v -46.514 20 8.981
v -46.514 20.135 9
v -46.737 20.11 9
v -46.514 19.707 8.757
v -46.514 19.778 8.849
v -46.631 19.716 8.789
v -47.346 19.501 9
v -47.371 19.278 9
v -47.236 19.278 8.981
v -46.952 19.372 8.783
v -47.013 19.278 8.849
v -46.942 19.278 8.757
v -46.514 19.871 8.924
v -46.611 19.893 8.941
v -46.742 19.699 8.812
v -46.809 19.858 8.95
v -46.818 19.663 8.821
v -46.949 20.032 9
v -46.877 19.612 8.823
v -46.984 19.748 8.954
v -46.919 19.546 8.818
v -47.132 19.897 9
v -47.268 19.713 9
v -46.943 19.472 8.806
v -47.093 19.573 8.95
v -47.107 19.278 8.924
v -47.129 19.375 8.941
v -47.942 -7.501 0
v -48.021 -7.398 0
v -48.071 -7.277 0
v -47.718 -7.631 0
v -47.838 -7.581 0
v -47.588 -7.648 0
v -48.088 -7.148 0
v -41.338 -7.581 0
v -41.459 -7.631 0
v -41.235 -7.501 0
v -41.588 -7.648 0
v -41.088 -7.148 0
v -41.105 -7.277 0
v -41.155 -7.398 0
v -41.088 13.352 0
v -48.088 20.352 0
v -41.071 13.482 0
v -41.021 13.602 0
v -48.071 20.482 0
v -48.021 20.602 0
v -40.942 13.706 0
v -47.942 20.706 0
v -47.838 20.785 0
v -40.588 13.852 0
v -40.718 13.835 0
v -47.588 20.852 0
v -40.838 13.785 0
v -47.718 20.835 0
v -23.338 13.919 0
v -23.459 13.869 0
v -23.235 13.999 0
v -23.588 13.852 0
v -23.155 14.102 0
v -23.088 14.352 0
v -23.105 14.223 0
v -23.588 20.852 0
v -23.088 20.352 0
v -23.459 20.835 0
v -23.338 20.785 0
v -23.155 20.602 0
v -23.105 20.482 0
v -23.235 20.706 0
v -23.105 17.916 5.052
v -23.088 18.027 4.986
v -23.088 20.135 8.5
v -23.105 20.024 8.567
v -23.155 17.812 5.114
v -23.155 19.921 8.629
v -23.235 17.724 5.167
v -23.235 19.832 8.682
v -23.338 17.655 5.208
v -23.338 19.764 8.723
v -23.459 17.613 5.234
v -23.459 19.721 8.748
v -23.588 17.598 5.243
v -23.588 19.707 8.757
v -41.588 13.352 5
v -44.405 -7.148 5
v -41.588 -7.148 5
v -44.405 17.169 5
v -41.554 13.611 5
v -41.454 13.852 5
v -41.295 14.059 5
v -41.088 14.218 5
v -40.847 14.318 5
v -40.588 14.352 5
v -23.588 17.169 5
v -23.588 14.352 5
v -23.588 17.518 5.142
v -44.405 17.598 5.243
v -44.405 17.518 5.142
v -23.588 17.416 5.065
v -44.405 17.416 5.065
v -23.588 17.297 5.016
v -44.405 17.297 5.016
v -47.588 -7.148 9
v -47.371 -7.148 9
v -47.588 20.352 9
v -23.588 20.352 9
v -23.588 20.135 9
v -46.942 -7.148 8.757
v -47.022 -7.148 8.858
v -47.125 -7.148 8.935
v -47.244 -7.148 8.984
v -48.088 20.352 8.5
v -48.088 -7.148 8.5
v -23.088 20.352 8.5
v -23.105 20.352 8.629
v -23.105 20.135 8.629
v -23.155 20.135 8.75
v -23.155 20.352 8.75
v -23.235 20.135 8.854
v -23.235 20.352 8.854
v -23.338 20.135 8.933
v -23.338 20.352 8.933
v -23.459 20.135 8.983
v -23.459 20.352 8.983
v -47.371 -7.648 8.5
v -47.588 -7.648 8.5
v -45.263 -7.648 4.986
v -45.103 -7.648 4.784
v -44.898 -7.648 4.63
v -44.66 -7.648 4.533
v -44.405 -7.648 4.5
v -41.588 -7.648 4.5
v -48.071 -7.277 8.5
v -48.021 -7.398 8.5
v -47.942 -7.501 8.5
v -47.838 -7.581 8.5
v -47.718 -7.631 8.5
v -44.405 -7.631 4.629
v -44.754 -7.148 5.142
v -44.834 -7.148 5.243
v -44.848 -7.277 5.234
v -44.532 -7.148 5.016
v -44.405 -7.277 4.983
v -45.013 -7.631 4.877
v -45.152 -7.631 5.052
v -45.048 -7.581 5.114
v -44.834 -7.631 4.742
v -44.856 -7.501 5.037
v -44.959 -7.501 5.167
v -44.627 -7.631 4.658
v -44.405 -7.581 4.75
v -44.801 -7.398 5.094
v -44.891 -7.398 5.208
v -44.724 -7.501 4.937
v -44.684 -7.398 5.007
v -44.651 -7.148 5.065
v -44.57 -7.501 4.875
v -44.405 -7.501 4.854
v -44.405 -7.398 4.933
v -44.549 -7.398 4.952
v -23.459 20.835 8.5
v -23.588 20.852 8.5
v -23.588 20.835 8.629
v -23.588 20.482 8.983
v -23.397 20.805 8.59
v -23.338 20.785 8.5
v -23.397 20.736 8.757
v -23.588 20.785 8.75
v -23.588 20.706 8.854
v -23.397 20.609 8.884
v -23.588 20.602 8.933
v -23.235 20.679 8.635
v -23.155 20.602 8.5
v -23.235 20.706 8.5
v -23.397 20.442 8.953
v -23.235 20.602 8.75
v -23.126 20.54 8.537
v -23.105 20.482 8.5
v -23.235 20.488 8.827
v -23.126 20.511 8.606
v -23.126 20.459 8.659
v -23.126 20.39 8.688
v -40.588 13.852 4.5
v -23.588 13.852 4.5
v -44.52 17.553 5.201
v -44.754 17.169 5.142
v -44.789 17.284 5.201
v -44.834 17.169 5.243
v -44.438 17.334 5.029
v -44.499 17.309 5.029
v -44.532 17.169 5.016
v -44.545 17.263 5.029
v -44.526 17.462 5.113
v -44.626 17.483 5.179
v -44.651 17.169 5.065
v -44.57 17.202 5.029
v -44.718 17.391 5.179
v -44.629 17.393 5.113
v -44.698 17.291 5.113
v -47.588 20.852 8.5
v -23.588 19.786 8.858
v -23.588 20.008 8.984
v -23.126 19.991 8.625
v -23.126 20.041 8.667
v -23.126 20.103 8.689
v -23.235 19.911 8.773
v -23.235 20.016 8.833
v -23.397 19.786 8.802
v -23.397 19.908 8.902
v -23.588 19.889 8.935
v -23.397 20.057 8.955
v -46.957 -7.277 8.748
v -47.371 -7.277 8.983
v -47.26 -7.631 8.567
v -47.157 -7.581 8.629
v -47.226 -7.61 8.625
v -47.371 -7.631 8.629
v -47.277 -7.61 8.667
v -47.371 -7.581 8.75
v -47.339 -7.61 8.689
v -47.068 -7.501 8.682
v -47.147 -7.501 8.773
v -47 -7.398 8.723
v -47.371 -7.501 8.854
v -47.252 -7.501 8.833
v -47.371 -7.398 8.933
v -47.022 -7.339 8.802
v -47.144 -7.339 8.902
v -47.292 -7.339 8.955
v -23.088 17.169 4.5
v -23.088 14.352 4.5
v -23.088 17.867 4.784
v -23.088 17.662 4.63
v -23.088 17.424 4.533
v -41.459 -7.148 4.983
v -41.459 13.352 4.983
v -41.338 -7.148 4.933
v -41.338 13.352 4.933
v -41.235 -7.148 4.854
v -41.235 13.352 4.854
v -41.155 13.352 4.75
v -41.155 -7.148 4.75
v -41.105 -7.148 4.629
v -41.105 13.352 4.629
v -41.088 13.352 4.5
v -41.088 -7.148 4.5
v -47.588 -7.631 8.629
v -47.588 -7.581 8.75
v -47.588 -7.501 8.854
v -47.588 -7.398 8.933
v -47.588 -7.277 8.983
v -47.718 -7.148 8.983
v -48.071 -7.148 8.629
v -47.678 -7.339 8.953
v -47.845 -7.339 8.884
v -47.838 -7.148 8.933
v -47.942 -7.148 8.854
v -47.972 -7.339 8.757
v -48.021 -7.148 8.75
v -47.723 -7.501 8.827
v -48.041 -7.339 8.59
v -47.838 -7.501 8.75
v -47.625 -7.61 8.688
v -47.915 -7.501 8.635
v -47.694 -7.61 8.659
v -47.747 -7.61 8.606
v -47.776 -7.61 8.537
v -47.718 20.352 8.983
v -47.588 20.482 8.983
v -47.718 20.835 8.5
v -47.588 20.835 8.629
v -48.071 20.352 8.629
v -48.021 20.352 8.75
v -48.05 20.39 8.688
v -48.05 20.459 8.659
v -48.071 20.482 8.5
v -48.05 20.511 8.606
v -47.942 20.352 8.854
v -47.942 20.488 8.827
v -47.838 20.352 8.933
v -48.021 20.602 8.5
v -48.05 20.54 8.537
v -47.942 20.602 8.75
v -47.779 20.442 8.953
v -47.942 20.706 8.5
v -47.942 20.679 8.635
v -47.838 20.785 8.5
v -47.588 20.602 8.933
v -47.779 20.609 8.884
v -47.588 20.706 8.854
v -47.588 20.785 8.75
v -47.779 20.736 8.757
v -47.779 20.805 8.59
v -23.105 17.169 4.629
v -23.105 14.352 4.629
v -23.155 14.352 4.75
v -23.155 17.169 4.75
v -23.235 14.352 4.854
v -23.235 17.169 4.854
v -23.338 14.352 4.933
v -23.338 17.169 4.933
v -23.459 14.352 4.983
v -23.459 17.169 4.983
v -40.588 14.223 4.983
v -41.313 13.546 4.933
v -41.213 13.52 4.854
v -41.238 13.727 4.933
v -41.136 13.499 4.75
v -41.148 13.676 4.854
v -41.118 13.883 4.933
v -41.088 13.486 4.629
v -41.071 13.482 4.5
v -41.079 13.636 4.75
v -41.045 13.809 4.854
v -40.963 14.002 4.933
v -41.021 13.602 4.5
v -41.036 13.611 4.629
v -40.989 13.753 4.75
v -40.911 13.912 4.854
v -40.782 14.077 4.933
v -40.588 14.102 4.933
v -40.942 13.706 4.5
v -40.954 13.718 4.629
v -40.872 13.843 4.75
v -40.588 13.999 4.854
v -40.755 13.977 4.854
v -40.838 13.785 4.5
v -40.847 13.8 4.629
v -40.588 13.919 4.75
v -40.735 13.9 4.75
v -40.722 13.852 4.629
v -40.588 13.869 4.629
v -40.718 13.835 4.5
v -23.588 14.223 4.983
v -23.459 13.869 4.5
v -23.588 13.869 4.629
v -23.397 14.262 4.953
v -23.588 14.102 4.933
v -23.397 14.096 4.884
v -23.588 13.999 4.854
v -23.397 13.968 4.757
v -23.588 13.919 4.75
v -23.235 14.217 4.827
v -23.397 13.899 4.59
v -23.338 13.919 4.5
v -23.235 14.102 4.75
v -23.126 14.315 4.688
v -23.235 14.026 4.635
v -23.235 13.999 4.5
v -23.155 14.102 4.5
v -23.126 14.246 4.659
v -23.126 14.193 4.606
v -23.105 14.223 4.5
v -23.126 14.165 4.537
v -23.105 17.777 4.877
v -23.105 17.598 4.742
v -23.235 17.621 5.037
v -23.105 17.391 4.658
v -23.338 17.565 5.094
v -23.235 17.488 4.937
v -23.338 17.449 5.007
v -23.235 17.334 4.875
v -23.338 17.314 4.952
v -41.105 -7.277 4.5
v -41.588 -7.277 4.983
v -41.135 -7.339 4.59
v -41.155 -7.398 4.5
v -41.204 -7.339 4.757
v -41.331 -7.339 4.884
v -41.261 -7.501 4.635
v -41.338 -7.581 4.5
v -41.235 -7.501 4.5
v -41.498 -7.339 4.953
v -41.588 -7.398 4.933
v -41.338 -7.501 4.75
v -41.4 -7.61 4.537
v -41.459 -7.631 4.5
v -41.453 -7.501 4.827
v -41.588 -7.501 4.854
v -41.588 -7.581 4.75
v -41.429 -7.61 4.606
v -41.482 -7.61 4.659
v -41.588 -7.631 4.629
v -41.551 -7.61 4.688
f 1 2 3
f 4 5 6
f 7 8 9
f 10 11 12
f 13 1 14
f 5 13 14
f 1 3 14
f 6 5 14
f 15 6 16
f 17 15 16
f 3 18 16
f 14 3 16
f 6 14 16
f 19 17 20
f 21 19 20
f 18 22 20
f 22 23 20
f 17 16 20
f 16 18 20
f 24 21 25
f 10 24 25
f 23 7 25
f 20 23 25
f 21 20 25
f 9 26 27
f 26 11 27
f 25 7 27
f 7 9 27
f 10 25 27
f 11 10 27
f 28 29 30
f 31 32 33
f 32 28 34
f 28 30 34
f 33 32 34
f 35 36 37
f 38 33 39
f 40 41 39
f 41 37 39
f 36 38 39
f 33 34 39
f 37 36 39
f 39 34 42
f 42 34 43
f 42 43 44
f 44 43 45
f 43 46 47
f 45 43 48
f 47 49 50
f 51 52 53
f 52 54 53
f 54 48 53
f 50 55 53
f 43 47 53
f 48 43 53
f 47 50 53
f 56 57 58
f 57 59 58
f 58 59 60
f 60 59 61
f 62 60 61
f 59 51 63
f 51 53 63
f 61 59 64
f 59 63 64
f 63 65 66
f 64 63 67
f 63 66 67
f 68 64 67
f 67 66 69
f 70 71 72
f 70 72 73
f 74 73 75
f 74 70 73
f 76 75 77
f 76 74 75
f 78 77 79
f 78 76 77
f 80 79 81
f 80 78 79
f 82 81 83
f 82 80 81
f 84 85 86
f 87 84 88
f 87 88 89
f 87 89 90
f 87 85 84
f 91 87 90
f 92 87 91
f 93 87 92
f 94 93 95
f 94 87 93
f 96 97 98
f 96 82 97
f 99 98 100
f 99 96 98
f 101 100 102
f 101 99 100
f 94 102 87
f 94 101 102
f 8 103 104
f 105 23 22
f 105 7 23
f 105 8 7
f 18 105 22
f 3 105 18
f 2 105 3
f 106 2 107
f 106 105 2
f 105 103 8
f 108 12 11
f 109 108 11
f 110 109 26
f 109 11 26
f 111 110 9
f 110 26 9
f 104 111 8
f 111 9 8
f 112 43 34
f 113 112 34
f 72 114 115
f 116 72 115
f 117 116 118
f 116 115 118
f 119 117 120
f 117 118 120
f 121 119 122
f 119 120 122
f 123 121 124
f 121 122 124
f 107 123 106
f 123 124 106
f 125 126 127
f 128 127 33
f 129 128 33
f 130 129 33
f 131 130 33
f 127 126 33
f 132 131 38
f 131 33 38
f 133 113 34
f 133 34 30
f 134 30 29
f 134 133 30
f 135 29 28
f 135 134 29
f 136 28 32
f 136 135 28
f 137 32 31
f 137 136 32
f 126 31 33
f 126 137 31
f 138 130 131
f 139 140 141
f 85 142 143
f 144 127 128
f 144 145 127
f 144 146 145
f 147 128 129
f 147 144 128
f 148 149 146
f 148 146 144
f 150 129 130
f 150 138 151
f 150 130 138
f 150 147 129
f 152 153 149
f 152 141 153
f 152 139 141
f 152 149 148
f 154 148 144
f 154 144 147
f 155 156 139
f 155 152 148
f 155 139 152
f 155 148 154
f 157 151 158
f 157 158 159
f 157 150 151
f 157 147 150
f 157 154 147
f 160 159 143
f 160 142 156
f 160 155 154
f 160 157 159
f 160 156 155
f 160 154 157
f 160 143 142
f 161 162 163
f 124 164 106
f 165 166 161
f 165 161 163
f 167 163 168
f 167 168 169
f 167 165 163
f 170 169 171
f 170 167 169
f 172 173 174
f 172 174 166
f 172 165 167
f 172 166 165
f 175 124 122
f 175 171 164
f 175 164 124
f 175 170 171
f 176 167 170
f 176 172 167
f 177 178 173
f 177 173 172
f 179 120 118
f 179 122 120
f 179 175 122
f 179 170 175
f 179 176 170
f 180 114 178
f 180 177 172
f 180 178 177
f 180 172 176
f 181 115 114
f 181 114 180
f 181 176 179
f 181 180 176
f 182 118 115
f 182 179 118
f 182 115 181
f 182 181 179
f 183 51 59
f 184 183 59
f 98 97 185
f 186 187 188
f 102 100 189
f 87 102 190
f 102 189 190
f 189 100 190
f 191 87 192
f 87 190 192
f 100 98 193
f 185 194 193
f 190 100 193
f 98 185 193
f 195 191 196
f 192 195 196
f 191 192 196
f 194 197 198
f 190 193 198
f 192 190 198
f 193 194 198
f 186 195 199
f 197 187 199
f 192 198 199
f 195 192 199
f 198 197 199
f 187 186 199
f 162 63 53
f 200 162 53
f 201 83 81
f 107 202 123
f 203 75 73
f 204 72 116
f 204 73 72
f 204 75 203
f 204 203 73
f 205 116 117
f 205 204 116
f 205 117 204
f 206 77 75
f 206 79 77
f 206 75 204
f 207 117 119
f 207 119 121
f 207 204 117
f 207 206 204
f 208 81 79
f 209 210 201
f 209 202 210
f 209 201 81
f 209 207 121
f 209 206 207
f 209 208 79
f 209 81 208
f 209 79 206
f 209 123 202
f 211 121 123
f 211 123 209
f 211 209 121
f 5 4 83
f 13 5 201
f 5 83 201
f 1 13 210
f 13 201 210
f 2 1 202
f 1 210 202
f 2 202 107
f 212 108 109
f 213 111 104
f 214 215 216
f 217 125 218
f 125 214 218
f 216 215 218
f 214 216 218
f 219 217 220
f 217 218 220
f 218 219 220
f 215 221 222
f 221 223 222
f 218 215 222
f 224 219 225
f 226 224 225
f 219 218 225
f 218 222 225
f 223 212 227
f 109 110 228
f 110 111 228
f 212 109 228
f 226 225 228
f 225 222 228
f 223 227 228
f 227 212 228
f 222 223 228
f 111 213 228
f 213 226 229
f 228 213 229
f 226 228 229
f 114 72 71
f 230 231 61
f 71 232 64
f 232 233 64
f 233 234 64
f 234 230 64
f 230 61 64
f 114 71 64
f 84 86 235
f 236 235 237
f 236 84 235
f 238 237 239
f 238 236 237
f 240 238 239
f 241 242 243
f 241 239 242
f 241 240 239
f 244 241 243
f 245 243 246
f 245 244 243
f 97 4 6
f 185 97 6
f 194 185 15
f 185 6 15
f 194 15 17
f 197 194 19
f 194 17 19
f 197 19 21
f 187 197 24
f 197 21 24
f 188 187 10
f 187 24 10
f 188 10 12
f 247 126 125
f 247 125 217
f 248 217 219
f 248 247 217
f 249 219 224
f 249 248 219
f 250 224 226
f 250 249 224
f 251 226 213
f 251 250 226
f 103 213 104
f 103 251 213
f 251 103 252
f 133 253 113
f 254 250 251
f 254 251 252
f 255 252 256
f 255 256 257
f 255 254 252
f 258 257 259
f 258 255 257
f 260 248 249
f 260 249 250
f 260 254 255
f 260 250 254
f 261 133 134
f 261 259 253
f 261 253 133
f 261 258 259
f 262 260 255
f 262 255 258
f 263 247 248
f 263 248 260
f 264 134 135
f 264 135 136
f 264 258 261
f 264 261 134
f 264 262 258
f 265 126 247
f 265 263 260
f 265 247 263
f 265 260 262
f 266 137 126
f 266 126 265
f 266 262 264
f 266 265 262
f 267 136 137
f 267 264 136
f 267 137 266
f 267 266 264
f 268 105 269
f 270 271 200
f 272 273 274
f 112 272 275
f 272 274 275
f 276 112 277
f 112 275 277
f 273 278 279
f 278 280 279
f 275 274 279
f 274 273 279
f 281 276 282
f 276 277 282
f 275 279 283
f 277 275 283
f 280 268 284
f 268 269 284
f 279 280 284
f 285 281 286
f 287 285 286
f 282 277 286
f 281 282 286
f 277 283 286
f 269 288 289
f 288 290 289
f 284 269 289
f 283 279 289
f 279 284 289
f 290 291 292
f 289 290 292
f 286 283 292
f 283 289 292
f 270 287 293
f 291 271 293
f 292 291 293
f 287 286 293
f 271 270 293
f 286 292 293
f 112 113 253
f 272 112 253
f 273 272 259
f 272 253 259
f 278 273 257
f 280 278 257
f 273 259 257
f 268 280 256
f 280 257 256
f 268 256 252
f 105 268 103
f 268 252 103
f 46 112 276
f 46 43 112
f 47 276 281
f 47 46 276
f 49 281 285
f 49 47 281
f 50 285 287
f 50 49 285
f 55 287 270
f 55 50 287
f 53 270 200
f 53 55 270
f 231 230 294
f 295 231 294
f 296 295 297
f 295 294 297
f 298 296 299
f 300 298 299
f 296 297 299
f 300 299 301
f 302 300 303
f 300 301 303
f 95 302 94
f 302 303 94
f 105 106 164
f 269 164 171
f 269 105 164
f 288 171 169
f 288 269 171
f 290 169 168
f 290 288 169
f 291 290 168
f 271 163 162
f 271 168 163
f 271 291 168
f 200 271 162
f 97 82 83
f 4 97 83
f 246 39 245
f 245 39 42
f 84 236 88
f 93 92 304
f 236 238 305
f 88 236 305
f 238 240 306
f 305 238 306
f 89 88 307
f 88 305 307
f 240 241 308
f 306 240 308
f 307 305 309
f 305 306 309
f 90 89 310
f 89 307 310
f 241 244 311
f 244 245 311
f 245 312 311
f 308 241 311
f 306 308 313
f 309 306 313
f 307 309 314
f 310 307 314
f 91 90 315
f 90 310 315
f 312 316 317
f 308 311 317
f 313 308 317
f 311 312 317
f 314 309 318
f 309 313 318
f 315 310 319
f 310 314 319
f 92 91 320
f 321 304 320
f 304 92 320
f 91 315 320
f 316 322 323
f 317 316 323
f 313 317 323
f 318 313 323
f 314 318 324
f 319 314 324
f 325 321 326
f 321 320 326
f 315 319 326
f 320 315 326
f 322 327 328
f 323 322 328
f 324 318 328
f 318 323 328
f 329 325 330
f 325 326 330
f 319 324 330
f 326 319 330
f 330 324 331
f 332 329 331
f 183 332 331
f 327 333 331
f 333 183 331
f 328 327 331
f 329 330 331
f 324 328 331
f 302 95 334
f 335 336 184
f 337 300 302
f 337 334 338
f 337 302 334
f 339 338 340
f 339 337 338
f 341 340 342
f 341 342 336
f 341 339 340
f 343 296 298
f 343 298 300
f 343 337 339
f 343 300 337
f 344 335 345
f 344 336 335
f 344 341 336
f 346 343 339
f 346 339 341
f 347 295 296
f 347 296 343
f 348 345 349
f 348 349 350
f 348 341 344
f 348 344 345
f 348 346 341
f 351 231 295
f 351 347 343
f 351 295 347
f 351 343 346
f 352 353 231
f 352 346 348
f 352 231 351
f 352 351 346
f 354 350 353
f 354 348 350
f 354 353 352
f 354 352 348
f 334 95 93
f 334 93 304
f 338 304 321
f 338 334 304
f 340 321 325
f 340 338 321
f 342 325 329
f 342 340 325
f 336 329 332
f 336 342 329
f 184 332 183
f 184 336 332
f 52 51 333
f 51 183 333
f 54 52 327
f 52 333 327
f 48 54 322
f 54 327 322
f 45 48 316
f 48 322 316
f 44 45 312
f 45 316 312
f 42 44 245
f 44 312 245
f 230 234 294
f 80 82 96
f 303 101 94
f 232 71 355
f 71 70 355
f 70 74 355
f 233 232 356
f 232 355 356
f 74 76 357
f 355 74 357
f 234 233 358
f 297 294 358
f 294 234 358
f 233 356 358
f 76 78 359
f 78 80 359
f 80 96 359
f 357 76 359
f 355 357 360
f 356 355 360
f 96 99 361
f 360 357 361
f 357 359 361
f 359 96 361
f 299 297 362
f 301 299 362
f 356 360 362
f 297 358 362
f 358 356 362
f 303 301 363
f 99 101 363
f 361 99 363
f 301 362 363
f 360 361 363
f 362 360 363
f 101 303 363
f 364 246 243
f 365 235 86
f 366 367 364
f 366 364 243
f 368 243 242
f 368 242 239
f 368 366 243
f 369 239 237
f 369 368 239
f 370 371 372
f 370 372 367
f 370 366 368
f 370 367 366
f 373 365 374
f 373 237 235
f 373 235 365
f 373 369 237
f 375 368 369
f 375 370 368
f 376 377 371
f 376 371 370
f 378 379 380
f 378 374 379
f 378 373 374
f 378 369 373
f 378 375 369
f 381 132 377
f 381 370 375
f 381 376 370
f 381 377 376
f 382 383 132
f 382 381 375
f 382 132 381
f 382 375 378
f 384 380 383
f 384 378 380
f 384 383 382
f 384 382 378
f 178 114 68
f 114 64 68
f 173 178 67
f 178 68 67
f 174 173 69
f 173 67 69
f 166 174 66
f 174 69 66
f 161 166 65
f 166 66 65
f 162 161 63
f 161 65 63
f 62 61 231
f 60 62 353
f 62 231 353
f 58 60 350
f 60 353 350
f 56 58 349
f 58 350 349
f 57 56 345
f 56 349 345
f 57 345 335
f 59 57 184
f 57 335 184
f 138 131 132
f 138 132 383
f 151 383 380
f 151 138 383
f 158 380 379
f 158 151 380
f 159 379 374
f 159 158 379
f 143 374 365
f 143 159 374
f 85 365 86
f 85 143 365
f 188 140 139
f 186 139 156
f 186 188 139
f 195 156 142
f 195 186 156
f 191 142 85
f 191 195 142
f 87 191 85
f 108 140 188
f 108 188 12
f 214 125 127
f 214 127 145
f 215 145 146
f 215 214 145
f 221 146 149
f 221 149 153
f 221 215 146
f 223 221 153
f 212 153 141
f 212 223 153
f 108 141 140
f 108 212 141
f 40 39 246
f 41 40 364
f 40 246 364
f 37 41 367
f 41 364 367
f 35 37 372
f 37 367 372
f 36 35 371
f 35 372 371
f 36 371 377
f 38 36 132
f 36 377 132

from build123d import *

# Parameters (mm, degrees)
F0_W         = 18
F0_H         = 7
F1_DEPTH     = 5
F2_W         = 21
F2_H         = 4
F3_DEPTH     = 4
F4_T4_DEPTH  = 37.431305486
F4_T9_DEPTH  = 33.931305486
F4_T15_DEPTH = 33.931305486
F4_T21_DEPTH = 37.431305486
F5_R         = 0.5
F6_T1_DEPTH  = 2.8169048105
F6_T3_DEPTH  = 2.8169048105
F6_T5_DEPTH  = 0.2169048105
F6_T7_DEPTH  = 4.0985711369
F6_T9_DEPTH  = 0.2169048105
F6_T11_DEPTH = 4.0985711369
F6_S15_W     = 0.5
F6_S15_H     = 0.5
F6_T16_DEPTH = 0.5
F6_S21_W     = 0.5
F6_S21_H     = 0.5
F6_T22_DEPTH = 0.5
F6_S27_W     = 0.5
F6_S27_H     = 0.5
F6_T28_DEPTH = 0.5
F6_S33_W     = 0.5
F6_S33_H     = 0.5
F6_T34_DEPTH = 0.5
F6_T38_ANGLE = 59.0362434679
F6_T40_ANGLE = 59.0362434679
F6_T42_ANGLE = 59.0362434679
F6_T44_ANGLE = 59.0362434679


# Not quite as in the source:
# - a fillet or chamfer that OpenCascade refuses, or shapes differently, is made with other operations: its cross-section is extruded or revolved along the edge and cut away or added


with BuildPart() as f1:
    # F0 (on Top) → F1 (new body)
    with BuildSketch(Plane.XY):
        Polygon((-41.0881050097, 20.8523701802), (-48.0881050097, 20.8523701802), (-48.0881050097, -7.6476298198), (-41.0881050097, -7.6476298198), (-41.0881050097, 13.8523701802), align=None)
        with Locations((-32.0881050097, 17.3523701802)):
            Rectangle(F0_W, F0_H)
    extrude(amount=F1_DEPTH)

    # F2 (on face) → F3 (join)
    with BuildSketch(Plane.XY.offset(5)):
        Polygon((-44.0881050097, 20.8523701802), (-48.0881050097, 20.8523701802), (-48.0881050097, -7.6476298198), (-44.0881050097, -7.6476298198), (-44.0881050097, 16.8523701802), align=None)
        with Locations((-33.5881050097, 18.8523701802)):
            Rectangle(F2_W, F2_H)
    extrude(amount=F3_DEPTH)

    # F4: chamfer of 5 x 3 on 2 edges, made by hand


with BuildPart() as f4_tool2:
    # F4_s3 → F4_t4 (new body)
    with BuildSketch(Plane.XZ.offset(20.5789353058)):
        Polygon((-44.0881050097, 4), (-47.0881050097, 9), (-44.0881050097, 9), align=None)
    extrude(amount=-F4_T4_DEPTH)

    split(bisect_by=Plane.XY.offset(5), keep=Keep.TOP)


with BuildPart() as f1_1:
    add(f1.part)

    # F4_t1: cut F4_tool2
    add(f4_tool2.part, mode=Mode.SUBTRACT)


with BuildPart() as f4_tool7:
    # F4_s8 → F4_t9 (new body)
    with BuildSketch(Plane.YZ.offset(-44.0881050097)):
        Polygon((16.8523701802, 4), (19.8523701802, 9), (16.8523701802, 9), align=None)
    extrude(amount=F4_T9_DEPTH)

    split(bisect_by=Plane.XY.offset(5), keep=Keep.TOP)


with BuildPart() as f1_2:
    add(f1_1.part)

    # F4_t6: cut F4_tool7
    add(f4_tool7.part, mode=Mode.SUBTRACT)


with BuildPart() as f4_tool13:
    # F4_s14 → F4_t15 (new body)
    with BuildSketch(Plane.YZ.offset(-57.0194104957)):
        Polygon((16.8523701802, 4), (19.8523701802, 9), (16.8523701802, 9), align=None)
    extrude(amount=F4_T15_DEPTH)

    split(bisect_by=Plane.YZ.offset(-48.0881050097), keep=Keep.TOP)

    split(bisect_by=Plane.YZ.offset(-44.0881050097), keep=Keep.BOTTOM)

    split(bisect_by=Plane.XY.offset(5), keep=Keep.TOP)


with BuildPart() as f4_tool19:
    # F4_s20 → F4_t21 (new body)
    with BuildSketch(Plane.XZ.offset(7.6476298198)):
        Polygon((-44.0881050097, 4), (-47.0881050097, 9), (-44.0881050097, 9), align=None)
    extrude(amount=-F4_T21_DEPTH)

    split(bisect_by=Plane.XZ.offset(-16.8523701802), keep=Keep.BOTTOM)

    split(bisect_by=Plane.XY.offset(5), keep=Keep.TOP)

    split(bisect_by=Plane.XZ.offset(-20.8523701802), keep=Keep.TOP)


with BuildPart() as f4_tool13_1:
    add(f4_tool13.part)

    # F4_t25: intersect F4_tool19
    add(f4_tool19.part, mode=Mode.INTERSECT)


with BuildPart() as f1_3:
    add(f1_2.part)

    # F4_t11: cut F4_tool13
    add(f4_tool13_1.part, mode=Mode.SUBTRACT)

    # F5
    f5_edges = [f1_3.edges().sort_by_distance(p)[0] for p in [
        (-48.088105, -7.64763, 4.5),
        (-41.088105, -7.64763, 2.5),
        (-41.088105, 13.85237, 2.5),
        (-23.088105, 13.85237, 2.5),
        (-23.088105, 20.85237, 4.5),
        (-35.588105, 20.85237, 9),
        (-35.088105, 19.85237, 9),
        (-47.088105, 6.10237, 9),
        (-45.888105, 18.65237, 7),
        (-33.888105, 17.45237, 5),
        (-44.688105, 4.90237, 5),
        (-41.088105, 3.10237, 5),
        (-32.088105, 13.85237, 5),
        (-48.088105, 6.60237, 9),
        (-48.088105, 20.85237, 4.5),
    ]]
    fillet(f5_edges, radius=F5_R)

    # F6: fillet of radius 0.5 on 10 edges, made by hand

    # F6_s2 → F6_t1 (cut)
    with BuildSketch(Plane.YZ.offset(-44.4050098202)):
        with BuildLine():
            ThreePointArc((-7.6476298198, 4.5), (-7.5011832104, 4.8535533906), (-7.1476298198, 5))
            Line((-7.1476298198, 5), (-7.6476298198, 5))
            Line((-7.6476298198, 5), (-7.6476298198, 4.5))
        make_face()
    extrude(amount=F6_T1_DEPTH, mode=Mode.SUBTRACT)

    # F6_s4 → F6_t3 (cut)
    with BuildSketch(Plane.XZ.offset(-17.1692749907)):
        with BuildLine():
            ThreePointArc((-23.0881050097, 4.5), (-23.2345516191, 4.8535533906), (-23.5881050097, 5))
            Line((-23.5881050097, 5), (-23.0881050097, 5))
            Line((-23.0881050097, 5), (-23.0881050097, 4.5))
        make_face()
    extrude(amount=F6_T3_DEPTH, mode=Mode.SUBTRACT)

    # F6_s6 → F6_t5 (cut)
    with BuildSketch(Plane.YZ.offset(-47.5881050097)):
        with BuildLine():
            ThreePointArc((-7.6476298198, 8.5), (-7.5011832104, 8.8535533906), (-7.1476298198, 9))
            Line((-7.1476298198, 9), (-7.6476298198, 9))
            Line((-7.6476298198, 9), (-7.6476298198, 8.5))
        make_face()
    extrude(amount=F6_T5_DEPTH, mode=Mode.SUBTRACT)

    # F6_s8 → F6_t7 (cut)
    with BuildSketch(Plane(origin=(-16.2894353468, 0, 27.1490589114), x_dir=(0, 1, 0), z_dir=(0.5144957554, 0, -0.8574929257))):
        with BuildLine():
            ThreePointArc((-7.6476298198, -36.2472551322), (-7.5011832104, -35.8937017416), (-7.1476298198, -35.7472551322))
            Line((-7.1476298198, -35.7472551322), (-7.6476298198, -35.7472551322))
            Line((-7.6476298198, -35.7472551322), (-7.6476298198, -36.2472551322))
        make_face()
    extrude(amount=F6_T7_DEPTH, mode=Mode.SUBTRACT)

    # F6_s10 → F6_t9 (cut)
    with BuildSketch(Plane.XZ.offset(-20.3523701802)):
        with BuildLine():
            ThreePointArc((-23.0881050097, 8.5), (-23.2345516191, 8.8535533906), (-23.5881050097, 9))
            Line((-23.5881050097, 9), (-23.0881050097, 9))
            Line((-23.0881050097, 9), (-23.0881050097, 8.5))
        make_face()
    extrude(amount=F6_T9_DEPTH, mode=Mode.SUBTRACT)

    # F6_s12 → F6_t11 (cut)
    with BuildSketch(Plane(origin=(0, 6.971278674, 11.61879779), x_dir=(1, 0, 0), z_dir=(0, 0.5144957554, 0.8574929257))):
        with BuildLine():
            ThreePointArc((-23.0881050097, 12.8928051893), (-23.2345516191, 12.5392517987), (-23.5881050097, 12.3928051893))
            Line((-23.5881050097, 12.3928051893), (-23.0881050097, 12.3928051893))
            Line((-23.0881050097, 12.3928051893), (-23.0881050097, 12.8928051893))
        make_face()
    extrude(amount=F6_T11_DEPTH, mode=Mode.SUBTRACT)


with BuildPart() as f6_tool14:
    # F6_s15 → F6_t16 (new body)
    with BuildSketch(Plane.YZ.offset(-23.5881050097)):
        with Locations((20.6023701802, 8.75)):
            Rectangle(F6_S15_W, F6_S15_H)
    extrude(amount=F6_T16_DEPTH)

    # F6_s17 → F6_t18 (revolve, cut)
    with BuildSketch(Plane(origin=(-23.5881050097, 20.3523701802, 8.5), x_dir=(0, -0.7071067812, -0.7071067812), z_dir=(0, -0.7071067812, 0.7071067812))):
        with BuildLine():
            ThreePointArc((0, -0.5), (0.5, 0), (0, 0.5))
            Line((0, 0.5), (0, -0.5))
        make_face()
    revolve(axis=Axis((-23.5881050097, 20.3523701802, 8.5), (1, 0, 0)), mode=Mode.SUBTRACT)


with BuildPart() as f1_4:
    add(f1_3.part)

    # F6_t13: cut F6_tool14
    add(f6_tool14.part, mode=Mode.SUBTRACT)


with BuildPart() as f6_tool20:
    # F6_s21 → F6_t22 (new body)
    with BuildSketch(Plane.XZ.offset(7.1476298198)):
        with Locations((-47.8381050097, 8.75)):
            Rectangle(F6_S21_W, F6_S21_H)
    extrude(amount=F6_T22_DEPTH)

    # F6_s23 → F6_t24 (revolve, cut)
    with BuildSketch(Plane(origin=(-47.5881050097, -7.1476298198, 8.5), x_dir=(0.7071067812, 0, -0.7071067812), z_dir=(-0.7071067812, 0, -0.7071067812))):
        with BuildLine():
            ThreePointArc((0, -0.5), (0.5, 0), (0, 0.5))
            Line((0, 0.5), (0, -0.5))
        make_face()
    revolve(axis=Axis((-47.5881050097, -7.1476298198, 8.5), (0, -1, 0)), mode=Mode.SUBTRACT)


with BuildPart() as f1_5:
    add(f1_4.part)

    # F6_t19: cut F6_tool20
    add(f6_tool20.part, mode=Mode.SUBTRACT)


with BuildPart() as f6_tool26:
    # F6_s27 → F6_t28 (new body)
    with BuildSketch(Plane.YZ.offset(-23.5881050097)):
        with Locations((14.1023701802, 4.75)):
            Rectangle(F6_S27_W, F6_S27_H)
    extrude(amount=F6_T28_DEPTH)

    # F6_s29 → F6_t30 (revolve, cut)
    with BuildSketch(Plane(origin=(-23.5881050097, 14.3523701802, 4.5), x_dir=(0, 0.7071067812, -0.7071067812), z_dir=(0, -0.7071067812, -0.7071067812))):
        with BuildLine():
            ThreePointArc((0, -0.5), (0.5, 0), (0, 0.5))
            Line((0, 0.5), (0, -0.5))
        make_face()
    revolve(axis=Axis((-23.5881050097, 14.3523701802, 4.5), (1, 0, 0)), mode=Mode.SUBTRACT)


with BuildPart() as f1_6:
    add(f1_5.part)

    # F6_t25: cut F6_tool26
    add(f6_tool26.part, mode=Mode.SUBTRACT)


with BuildPart() as f6_tool32:
    # F6_s33 → F6_t34 (new body)
    with BuildSketch(Plane.XZ.offset(7.1476298198)):
        with Locations((-41.3381050097, 4.75)):
            Rectangle(F6_S33_W, F6_S33_H)
    extrude(amount=F6_T34_DEPTH)

    # F6_s35 → F6_t36 (revolve, cut)
    with BuildSketch(Plane(origin=(-41.5881050097, -7.1476298198, 4.5), x_dir=(-0.7071067812, 0, -0.7071067812), z_dir=(-0.7071067812, 0, 0.7071067812))):
        with BuildLine():
            ThreePointArc((0, -0.5), (0.5, 0), (0, 0.5))
            Line((0, 0.5), (0, -0.5))
        make_face()
    revolve(axis=Axis((-41.5881050097, -7.1476298198, 4.5), (0, -1, 0)), mode=Mode.SUBTRACT)


with BuildPart() as f1_7:
    add(f1_6.part)

    # F6_t31: cut F6_tool32
    add(f6_tool32.part, mode=Mode.SUBTRACT)

    # F6_s37 → F6_t38 (revolve, cut)
    with BuildSketch(Plane(origin=(-16.2894353468, 0, 27.1490589114), x_dir=(0, 1, 0), z_dir=(0.5144957554, 0, -0.8574929257))):
        with BuildLine():
            ThreePointArc((-7.6476298198, -36.2472551322), (-7.5011832104, -35.8937017416), (-7.1476298198, -35.7472551322))
            Line((-7.1476298198, -35.7472551322), (-7.6476298198, -35.7472551322))
            Line((-7.6476298198, -35.7472551322), (-7.6476298198, -36.2472551322))
        make_face()
    revolve(axis=Axis((-47.3712001992, -7.6476298198, 8.5), (0, -1, 0)), revolution_arc=F6_T38_ANGLE, mode=Mode.SUBTRACT)

    # F6_s39 → F6_t40 (revolve, cut)
    with BuildSketch(Plane(origin=(-14.1807378936, 0, 23.634563156), x_dir=(0, 1, 0), z_dir=(-0.5144957554, 0, 0.8574929257))):
        with BuildLine():
            ThreePointArc((-7.6476298198, 36.2472551322), (-7.5011832104, 35.8937017416), (-7.1476298198, 35.7472551322))
            Line((-7.1476298198, 35.7472551322), (-7.6476298198, 35.7472551322))
            Line((-7.6476298198, 35.7472551322), (-7.6476298198, 36.2472551322))
        make_face()
    revolve(axis=Axis((-44.4050098202, -7.6476298198, 5.5), (0, -1, 0)), revolution_arc=F6_T40_ANGLE, mode=Mode.SUBTRACT)

    # F6_s41 → F6_t42 (revolve, cut)
    with BuildSketch(Plane(origin=(0, 6.971278674, 11.61879779), x_dir=(1, 0, 0), z_dir=(0, 0.5144957554, 0.8574929257))):
        with BuildLine():
            ThreePointArc((-23.0881050097, 12.8928051893), (-23.2345516191, 12.5392517987), (-23.5881050097, 12.3928051893))
            Line((-23.5881050097, 12.3928051893), (-23.0881050097, 12.3928051893))
            Line((-23.0881050097, 12.3928051893), (-23.0881050097, 12.8928051893))
        make_face()
    revolve(axis=Axis((-23.0881050097, 17.1692749907, 5.5), (-1, 0, 0)), revolution_arc=F6_T42_ANGLE, mode=Mode.SUBTRACT)

    # F6_s43 → F6_t44 (revolve, cut)
    with BuildSketch(Plane(origin=(0, 9.0799761273, 15.1332935454), x_dir=(1, 0, 0), z_dir=(0, -0.5144957554, -0.8574929257))):
        with BuildLine():
            ThreePointArc((-23.0881050097, -12.8928051893), (-23.2345516191, -12.5392517987), (-23.5881050097, -12.3928051893))
            Line((-23.5881050097, -12.3928051893), (-23.0881050097, -12.3928051893))
            Line((-23.0881050097, -12.3928051893), (-23.0881050097, -12.8928051893))
        make_face()
    revolve(axis=Axis((-23.0881050097, 20.1354653697, 8.5), (-1, 0, 0)), revolution_arc=F6_T44_ANGLE, mode=Mode.SUBTRACT)


solid = f1_7.part
